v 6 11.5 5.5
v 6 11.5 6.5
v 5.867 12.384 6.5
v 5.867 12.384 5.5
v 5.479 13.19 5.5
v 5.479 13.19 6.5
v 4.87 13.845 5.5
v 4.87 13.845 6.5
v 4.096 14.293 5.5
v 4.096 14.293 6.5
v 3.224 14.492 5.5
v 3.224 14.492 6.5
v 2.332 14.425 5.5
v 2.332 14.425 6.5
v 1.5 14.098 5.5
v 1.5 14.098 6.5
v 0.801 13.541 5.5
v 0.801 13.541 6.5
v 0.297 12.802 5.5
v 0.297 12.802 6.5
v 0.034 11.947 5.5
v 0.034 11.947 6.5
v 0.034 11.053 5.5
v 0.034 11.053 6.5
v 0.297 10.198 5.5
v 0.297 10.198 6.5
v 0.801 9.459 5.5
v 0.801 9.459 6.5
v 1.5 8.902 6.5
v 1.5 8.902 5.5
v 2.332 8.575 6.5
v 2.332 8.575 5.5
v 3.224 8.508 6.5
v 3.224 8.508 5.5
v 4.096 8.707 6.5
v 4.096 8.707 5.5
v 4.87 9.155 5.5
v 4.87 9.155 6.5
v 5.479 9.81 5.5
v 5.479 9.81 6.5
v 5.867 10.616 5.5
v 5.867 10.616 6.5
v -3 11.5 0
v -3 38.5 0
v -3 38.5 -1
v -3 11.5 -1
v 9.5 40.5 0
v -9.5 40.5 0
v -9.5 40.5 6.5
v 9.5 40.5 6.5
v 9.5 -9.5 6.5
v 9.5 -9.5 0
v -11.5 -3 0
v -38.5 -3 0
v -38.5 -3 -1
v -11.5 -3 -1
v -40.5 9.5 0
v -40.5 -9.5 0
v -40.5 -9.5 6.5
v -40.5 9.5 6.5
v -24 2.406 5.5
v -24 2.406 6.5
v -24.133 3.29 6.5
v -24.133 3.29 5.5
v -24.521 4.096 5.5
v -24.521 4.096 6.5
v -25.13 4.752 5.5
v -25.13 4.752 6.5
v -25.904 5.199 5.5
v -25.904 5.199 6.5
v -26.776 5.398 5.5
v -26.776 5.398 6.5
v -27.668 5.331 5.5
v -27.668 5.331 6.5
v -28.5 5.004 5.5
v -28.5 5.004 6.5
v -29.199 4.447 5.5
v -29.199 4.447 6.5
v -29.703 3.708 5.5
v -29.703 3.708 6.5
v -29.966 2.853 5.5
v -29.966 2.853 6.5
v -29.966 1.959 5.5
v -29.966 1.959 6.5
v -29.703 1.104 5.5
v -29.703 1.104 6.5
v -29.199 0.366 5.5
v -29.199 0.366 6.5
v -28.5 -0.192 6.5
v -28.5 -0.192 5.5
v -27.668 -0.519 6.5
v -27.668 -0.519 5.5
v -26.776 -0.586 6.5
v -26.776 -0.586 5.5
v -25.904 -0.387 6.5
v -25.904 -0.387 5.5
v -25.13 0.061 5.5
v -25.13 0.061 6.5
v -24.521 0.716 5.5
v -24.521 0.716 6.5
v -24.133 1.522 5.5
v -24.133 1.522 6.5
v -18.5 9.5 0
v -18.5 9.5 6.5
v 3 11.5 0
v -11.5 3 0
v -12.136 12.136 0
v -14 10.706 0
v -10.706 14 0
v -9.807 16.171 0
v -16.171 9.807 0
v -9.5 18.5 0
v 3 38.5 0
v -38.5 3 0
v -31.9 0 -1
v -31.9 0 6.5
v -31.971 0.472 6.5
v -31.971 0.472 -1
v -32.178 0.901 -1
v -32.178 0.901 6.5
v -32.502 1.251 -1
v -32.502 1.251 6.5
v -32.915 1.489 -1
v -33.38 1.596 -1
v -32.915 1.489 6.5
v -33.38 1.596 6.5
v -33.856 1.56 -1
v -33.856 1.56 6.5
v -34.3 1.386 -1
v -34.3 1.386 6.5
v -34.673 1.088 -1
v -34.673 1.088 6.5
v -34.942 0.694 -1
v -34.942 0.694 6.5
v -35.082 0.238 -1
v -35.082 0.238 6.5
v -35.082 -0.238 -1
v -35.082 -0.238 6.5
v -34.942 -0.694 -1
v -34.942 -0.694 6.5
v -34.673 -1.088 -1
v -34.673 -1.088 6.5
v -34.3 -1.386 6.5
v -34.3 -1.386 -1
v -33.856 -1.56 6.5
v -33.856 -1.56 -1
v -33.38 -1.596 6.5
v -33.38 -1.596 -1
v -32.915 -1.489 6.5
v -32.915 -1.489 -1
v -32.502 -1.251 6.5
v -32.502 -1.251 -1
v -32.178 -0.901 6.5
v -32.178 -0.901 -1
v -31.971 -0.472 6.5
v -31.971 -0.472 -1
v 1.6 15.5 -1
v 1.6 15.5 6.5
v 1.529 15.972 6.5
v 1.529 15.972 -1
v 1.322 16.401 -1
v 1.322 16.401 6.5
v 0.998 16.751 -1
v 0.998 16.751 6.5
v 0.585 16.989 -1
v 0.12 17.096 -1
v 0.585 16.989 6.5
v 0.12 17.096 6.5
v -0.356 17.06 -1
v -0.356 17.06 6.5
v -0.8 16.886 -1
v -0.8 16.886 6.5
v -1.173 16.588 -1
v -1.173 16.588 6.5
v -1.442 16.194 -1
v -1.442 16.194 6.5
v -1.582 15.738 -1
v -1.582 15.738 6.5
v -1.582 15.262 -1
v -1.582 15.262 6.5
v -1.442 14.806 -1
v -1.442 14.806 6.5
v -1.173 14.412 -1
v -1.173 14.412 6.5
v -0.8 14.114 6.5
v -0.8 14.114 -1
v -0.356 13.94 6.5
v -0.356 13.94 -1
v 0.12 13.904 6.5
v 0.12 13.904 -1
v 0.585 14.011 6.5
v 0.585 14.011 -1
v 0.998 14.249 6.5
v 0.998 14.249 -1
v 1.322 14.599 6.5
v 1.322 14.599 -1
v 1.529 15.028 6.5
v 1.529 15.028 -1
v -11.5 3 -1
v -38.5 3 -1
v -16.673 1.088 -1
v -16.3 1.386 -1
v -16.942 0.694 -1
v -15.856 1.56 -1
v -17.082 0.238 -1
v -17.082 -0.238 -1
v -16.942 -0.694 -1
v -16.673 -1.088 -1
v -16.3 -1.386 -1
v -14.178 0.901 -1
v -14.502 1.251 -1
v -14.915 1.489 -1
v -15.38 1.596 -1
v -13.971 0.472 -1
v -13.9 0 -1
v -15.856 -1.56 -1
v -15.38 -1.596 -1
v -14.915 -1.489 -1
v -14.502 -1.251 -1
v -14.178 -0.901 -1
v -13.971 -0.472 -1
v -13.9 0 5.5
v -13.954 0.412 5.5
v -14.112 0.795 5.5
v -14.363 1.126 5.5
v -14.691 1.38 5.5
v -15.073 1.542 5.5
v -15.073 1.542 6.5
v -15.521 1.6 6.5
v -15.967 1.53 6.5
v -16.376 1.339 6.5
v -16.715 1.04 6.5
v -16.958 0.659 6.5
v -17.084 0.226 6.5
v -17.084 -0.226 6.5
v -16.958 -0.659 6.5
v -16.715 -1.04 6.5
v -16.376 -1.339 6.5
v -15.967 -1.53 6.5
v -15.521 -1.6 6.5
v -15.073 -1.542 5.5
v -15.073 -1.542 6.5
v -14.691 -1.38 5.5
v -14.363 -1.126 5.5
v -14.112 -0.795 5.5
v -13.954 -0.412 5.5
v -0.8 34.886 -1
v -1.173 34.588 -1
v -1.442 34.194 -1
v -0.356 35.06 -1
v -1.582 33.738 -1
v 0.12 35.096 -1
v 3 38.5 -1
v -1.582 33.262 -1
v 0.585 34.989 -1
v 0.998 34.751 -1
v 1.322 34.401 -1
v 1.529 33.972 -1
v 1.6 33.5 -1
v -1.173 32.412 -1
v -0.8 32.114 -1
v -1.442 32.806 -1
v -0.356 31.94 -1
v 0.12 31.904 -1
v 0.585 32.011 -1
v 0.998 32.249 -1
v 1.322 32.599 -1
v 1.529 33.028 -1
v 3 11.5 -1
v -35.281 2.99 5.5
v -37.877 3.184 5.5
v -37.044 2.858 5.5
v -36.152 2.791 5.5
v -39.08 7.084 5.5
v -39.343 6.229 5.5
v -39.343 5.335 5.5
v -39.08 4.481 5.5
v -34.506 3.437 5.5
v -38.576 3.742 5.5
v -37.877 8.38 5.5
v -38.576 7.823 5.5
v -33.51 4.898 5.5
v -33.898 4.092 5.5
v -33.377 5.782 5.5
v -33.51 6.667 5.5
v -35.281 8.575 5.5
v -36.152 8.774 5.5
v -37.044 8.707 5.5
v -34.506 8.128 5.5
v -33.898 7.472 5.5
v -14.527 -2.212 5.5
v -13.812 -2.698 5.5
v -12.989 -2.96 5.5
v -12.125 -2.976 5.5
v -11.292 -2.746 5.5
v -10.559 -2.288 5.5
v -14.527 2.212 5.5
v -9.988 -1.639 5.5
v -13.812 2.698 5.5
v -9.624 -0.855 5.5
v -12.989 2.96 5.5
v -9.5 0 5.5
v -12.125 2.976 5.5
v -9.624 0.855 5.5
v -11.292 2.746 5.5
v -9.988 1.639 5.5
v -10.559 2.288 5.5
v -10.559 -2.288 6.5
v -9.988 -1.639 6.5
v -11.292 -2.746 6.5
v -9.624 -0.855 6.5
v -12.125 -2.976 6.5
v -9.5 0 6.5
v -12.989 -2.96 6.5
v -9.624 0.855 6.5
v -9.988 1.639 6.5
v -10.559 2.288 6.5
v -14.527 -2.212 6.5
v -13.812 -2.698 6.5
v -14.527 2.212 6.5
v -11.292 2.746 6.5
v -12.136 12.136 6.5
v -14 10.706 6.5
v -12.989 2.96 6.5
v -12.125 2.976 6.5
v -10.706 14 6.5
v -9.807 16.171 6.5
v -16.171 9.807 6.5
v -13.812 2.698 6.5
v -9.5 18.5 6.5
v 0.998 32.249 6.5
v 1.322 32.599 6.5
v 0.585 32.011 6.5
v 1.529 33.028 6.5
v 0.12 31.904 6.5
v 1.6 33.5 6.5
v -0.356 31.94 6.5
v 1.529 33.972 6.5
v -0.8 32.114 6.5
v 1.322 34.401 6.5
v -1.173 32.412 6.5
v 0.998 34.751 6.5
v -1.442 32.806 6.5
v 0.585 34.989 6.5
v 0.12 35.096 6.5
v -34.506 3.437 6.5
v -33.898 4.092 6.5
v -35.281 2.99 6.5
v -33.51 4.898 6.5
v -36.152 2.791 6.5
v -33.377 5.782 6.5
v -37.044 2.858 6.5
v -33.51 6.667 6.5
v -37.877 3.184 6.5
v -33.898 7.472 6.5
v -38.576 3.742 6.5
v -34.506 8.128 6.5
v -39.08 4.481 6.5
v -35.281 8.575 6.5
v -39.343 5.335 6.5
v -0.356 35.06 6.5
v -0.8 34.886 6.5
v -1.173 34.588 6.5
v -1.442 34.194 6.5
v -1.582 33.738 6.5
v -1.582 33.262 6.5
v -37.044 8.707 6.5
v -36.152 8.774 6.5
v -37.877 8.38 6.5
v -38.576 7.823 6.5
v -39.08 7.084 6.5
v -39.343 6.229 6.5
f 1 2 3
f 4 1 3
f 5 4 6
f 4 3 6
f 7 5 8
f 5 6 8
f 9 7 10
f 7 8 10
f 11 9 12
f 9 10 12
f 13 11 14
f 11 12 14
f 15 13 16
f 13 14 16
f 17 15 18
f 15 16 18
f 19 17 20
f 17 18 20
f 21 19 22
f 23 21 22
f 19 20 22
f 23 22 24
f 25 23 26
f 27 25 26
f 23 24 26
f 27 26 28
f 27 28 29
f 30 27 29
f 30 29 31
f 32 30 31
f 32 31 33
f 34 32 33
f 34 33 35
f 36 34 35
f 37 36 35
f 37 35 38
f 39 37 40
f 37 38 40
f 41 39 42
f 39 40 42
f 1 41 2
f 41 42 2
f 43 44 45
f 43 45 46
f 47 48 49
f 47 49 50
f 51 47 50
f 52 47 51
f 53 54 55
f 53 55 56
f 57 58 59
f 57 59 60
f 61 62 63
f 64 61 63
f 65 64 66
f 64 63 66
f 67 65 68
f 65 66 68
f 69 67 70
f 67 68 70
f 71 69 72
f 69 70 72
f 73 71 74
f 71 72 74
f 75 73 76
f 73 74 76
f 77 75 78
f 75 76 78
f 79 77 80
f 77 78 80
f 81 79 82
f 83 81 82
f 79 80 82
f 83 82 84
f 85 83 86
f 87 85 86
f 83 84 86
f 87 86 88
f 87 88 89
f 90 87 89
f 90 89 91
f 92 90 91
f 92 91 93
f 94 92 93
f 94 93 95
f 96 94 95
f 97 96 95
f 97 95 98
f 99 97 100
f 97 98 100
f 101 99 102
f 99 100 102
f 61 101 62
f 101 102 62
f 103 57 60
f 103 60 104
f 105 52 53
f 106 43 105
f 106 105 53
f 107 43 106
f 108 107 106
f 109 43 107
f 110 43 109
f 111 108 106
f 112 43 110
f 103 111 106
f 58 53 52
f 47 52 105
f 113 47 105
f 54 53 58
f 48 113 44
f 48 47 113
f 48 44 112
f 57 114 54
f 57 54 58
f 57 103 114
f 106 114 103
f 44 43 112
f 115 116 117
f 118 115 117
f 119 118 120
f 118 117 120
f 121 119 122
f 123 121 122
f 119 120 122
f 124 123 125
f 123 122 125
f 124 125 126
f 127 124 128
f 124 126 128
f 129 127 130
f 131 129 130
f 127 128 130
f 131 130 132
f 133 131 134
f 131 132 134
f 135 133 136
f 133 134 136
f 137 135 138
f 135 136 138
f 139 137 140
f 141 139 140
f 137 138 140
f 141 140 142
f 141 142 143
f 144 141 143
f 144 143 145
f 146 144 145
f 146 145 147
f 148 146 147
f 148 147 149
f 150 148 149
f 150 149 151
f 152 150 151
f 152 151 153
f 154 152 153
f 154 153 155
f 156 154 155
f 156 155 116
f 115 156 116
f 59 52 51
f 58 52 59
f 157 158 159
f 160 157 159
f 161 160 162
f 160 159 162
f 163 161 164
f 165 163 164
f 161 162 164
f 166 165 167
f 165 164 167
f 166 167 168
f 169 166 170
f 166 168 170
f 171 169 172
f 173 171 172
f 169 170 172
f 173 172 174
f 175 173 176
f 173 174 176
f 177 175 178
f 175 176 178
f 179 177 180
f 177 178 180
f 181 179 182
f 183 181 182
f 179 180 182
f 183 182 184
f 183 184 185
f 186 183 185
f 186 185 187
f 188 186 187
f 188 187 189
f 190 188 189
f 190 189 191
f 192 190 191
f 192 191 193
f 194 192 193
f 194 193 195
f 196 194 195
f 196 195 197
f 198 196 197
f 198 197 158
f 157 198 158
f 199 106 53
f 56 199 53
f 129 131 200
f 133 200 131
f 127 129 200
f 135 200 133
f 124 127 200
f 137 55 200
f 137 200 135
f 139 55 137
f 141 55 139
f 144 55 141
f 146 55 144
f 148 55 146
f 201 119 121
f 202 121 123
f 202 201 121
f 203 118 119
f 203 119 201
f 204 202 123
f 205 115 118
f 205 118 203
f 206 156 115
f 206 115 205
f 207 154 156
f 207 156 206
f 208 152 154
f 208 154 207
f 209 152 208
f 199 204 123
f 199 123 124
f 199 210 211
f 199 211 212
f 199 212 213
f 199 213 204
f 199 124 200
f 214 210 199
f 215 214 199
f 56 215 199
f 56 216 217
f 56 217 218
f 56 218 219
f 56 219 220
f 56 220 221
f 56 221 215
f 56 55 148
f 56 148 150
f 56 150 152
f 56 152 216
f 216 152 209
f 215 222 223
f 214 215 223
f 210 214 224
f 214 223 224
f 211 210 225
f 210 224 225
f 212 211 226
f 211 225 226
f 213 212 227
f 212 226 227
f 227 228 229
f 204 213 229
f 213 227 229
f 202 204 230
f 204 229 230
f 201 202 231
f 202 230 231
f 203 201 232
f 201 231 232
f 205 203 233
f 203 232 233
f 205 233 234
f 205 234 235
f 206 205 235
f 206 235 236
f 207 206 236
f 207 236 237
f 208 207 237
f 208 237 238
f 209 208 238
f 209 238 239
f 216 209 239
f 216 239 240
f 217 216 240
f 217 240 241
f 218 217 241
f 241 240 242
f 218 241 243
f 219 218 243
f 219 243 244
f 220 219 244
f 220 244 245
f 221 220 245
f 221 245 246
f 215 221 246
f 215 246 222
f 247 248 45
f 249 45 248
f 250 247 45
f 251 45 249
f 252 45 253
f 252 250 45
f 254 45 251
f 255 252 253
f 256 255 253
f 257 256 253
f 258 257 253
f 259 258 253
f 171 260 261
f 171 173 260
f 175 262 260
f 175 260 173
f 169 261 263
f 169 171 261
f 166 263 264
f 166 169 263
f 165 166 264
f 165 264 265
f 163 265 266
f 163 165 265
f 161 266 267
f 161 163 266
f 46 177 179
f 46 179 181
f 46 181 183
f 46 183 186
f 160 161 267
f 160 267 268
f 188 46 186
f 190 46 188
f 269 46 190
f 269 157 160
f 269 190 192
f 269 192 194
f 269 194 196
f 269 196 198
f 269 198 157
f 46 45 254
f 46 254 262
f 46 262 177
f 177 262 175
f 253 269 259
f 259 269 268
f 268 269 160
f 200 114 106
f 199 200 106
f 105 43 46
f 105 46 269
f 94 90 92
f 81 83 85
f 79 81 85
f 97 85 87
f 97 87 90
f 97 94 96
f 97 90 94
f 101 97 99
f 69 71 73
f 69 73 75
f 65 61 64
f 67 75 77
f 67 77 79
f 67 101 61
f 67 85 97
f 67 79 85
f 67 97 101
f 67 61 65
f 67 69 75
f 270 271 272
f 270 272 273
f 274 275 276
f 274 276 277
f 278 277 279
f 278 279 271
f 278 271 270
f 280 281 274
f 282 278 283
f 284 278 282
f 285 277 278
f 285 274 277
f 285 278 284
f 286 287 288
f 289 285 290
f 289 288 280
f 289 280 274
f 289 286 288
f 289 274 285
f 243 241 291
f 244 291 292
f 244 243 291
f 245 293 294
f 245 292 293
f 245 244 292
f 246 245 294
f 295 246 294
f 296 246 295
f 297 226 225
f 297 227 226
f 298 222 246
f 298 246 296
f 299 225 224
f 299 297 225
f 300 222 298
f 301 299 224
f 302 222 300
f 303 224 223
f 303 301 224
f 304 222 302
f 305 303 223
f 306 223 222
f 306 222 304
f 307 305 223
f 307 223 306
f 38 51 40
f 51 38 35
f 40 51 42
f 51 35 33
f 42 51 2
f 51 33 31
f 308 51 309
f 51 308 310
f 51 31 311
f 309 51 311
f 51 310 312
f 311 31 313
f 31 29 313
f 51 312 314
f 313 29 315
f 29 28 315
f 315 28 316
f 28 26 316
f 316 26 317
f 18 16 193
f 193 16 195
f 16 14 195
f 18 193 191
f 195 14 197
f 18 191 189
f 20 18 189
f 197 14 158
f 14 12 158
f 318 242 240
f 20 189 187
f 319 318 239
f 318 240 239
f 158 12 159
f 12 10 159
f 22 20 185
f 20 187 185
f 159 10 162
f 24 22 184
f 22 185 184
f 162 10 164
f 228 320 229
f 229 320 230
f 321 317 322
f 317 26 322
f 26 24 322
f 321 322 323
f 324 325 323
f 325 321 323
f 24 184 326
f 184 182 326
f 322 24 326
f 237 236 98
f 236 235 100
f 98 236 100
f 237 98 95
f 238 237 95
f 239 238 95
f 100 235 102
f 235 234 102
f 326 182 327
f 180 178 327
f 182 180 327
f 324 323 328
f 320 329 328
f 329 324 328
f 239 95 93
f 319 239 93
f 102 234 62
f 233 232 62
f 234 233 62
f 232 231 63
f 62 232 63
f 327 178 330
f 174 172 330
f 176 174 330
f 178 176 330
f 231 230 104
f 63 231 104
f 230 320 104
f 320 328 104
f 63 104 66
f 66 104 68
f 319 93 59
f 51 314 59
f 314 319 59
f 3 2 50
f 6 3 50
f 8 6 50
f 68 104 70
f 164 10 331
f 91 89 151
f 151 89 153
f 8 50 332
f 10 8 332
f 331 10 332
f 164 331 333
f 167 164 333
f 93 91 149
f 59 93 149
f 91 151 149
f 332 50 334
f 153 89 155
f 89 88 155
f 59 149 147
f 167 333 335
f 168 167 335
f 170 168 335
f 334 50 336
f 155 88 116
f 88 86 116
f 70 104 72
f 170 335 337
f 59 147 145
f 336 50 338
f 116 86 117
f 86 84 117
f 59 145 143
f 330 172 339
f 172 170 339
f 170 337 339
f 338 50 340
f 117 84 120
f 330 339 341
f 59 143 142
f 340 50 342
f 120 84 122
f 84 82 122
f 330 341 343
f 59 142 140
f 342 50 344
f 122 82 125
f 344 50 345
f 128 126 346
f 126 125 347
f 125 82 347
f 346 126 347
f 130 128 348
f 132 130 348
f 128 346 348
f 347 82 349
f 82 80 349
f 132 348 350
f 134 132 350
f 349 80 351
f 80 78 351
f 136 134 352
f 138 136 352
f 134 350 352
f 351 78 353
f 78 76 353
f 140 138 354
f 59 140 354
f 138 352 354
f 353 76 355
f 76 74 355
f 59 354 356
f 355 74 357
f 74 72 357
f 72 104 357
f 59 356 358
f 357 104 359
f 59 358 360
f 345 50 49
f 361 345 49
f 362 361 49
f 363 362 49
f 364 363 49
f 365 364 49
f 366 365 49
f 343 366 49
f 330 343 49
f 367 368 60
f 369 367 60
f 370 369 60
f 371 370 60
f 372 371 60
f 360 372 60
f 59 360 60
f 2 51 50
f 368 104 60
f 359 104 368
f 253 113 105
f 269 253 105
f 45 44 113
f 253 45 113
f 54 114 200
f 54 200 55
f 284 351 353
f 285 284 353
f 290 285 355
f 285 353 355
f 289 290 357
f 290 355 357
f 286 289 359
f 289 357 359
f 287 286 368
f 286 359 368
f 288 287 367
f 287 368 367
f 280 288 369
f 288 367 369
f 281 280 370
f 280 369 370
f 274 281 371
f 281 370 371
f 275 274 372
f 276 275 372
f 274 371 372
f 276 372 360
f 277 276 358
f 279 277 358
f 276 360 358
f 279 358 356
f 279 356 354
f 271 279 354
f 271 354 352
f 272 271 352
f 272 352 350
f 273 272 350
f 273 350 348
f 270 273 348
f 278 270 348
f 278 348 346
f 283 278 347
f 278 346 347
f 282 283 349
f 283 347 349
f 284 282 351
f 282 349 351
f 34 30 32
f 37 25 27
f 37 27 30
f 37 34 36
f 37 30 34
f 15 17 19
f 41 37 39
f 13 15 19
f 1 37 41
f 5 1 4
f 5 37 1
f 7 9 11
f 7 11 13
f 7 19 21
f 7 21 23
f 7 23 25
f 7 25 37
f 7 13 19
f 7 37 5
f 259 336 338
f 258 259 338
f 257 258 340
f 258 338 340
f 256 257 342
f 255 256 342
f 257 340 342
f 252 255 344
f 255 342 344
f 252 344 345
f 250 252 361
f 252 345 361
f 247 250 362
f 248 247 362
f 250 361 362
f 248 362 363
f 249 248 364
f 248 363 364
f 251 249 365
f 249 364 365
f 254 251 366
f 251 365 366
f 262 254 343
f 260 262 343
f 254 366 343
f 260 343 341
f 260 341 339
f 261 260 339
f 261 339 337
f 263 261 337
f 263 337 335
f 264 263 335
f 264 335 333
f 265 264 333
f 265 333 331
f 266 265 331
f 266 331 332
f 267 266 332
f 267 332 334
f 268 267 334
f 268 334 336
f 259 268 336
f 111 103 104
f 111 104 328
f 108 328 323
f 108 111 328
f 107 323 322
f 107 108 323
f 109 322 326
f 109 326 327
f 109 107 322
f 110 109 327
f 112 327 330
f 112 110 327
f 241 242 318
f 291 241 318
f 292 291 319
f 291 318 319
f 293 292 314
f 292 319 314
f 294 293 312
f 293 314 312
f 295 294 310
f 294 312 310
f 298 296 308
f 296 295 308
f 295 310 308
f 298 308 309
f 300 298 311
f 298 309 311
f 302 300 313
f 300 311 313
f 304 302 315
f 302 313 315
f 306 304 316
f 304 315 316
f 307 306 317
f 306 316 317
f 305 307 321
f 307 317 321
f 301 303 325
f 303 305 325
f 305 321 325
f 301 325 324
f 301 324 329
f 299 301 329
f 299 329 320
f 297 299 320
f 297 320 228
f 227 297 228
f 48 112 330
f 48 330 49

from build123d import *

# Parameters (mm, degrees)
PAD_DEPTH       = 6.5
SKETCH001_W     = 27
SKETCH001_H     = 6
SKETCH001_W_2   = 6
SKETCH001_H_2   = 27
PAD001_DEPTH    = 1
SKETCH002_R     = 1.6
POCKET_DEPTH    = 7.501
SKETCH003_R     = 3
POCKET001_DEPTH = 1


with BuildPart() as part:
    # Sketch → Pad (new body)
    with BuildSketch(Plane.XY):
        with BuildLine():
            Line((-9.5, 40.5), (9.5, 40.5))
            Line((9.5, 40.5), (9.5, -9.5))
            Line((9.5, -9.5), (-40.5, -9.5))
            Line((-40.5, -9.5), (-40.5, 9.5))
            Line((-40.5, 9.5), (-18.5, 9.5))
            ThreePointArc((-18.5, 9.5), (-12.136039, 12.136039), (-9.5, 18.5))
            Line((-9.5, 18.5), (-9.5, 40.5))
        make_face()
    extrude(amount=PAD_DEPTH)

    # Sketch001 → Pad001 (new body)
    with BuildSketch(Plane(origin=(0, 0, 0), x_dir=(1, 0, 0), z_dir=(0, 0, -1))):
        with Locations((-25, 0)):
            Rectangle(SKETCH001_W, SKETCH001_H)
        with Locations((0, -25)):
            Rectangle(SKETCH001_W_2, SKETCH001_H_2)
    extrude(amount=PAD001_DEPTH)

    # Sketch002 → Pocket (cut, through all)
    with BuildSketch(Plane.XY.offset(6.5)):
        with Locations((-33.5, 0)):
            Circle(SKETCH002_R)
        with Locations((-15.5, 0)):
            Circle(SKETCH002_R)
        with Locations((0, 15.5)):
            Circle(SKETCH002_R)
        with Locations((0, 33.5)):
            Circle(SKETCH002_R)
    extrude(amount=-POCKET_DEPTH, mode=Mode.SUBTRACT)

    # Sketch003 → Pocket001 (cut)
    with BuildSketch(Plane.XY.offset(6.5)):
        with Locations((3, 11.5)):
            Circle(SKETCH003_R)
        with Locations((-12.5, 0)):
            Circle(SKETCH003_R)
        with Locations((-36.376617, 5.782363)):
            Circle(SKETCH003_R)
        with Locations((-27, 2.406107)):
            Circle(SKETCH003_R)
    extrude(amount=-POCKET001_DEPTH, mode=Mode.SUBTRACT)


solid = part.part
